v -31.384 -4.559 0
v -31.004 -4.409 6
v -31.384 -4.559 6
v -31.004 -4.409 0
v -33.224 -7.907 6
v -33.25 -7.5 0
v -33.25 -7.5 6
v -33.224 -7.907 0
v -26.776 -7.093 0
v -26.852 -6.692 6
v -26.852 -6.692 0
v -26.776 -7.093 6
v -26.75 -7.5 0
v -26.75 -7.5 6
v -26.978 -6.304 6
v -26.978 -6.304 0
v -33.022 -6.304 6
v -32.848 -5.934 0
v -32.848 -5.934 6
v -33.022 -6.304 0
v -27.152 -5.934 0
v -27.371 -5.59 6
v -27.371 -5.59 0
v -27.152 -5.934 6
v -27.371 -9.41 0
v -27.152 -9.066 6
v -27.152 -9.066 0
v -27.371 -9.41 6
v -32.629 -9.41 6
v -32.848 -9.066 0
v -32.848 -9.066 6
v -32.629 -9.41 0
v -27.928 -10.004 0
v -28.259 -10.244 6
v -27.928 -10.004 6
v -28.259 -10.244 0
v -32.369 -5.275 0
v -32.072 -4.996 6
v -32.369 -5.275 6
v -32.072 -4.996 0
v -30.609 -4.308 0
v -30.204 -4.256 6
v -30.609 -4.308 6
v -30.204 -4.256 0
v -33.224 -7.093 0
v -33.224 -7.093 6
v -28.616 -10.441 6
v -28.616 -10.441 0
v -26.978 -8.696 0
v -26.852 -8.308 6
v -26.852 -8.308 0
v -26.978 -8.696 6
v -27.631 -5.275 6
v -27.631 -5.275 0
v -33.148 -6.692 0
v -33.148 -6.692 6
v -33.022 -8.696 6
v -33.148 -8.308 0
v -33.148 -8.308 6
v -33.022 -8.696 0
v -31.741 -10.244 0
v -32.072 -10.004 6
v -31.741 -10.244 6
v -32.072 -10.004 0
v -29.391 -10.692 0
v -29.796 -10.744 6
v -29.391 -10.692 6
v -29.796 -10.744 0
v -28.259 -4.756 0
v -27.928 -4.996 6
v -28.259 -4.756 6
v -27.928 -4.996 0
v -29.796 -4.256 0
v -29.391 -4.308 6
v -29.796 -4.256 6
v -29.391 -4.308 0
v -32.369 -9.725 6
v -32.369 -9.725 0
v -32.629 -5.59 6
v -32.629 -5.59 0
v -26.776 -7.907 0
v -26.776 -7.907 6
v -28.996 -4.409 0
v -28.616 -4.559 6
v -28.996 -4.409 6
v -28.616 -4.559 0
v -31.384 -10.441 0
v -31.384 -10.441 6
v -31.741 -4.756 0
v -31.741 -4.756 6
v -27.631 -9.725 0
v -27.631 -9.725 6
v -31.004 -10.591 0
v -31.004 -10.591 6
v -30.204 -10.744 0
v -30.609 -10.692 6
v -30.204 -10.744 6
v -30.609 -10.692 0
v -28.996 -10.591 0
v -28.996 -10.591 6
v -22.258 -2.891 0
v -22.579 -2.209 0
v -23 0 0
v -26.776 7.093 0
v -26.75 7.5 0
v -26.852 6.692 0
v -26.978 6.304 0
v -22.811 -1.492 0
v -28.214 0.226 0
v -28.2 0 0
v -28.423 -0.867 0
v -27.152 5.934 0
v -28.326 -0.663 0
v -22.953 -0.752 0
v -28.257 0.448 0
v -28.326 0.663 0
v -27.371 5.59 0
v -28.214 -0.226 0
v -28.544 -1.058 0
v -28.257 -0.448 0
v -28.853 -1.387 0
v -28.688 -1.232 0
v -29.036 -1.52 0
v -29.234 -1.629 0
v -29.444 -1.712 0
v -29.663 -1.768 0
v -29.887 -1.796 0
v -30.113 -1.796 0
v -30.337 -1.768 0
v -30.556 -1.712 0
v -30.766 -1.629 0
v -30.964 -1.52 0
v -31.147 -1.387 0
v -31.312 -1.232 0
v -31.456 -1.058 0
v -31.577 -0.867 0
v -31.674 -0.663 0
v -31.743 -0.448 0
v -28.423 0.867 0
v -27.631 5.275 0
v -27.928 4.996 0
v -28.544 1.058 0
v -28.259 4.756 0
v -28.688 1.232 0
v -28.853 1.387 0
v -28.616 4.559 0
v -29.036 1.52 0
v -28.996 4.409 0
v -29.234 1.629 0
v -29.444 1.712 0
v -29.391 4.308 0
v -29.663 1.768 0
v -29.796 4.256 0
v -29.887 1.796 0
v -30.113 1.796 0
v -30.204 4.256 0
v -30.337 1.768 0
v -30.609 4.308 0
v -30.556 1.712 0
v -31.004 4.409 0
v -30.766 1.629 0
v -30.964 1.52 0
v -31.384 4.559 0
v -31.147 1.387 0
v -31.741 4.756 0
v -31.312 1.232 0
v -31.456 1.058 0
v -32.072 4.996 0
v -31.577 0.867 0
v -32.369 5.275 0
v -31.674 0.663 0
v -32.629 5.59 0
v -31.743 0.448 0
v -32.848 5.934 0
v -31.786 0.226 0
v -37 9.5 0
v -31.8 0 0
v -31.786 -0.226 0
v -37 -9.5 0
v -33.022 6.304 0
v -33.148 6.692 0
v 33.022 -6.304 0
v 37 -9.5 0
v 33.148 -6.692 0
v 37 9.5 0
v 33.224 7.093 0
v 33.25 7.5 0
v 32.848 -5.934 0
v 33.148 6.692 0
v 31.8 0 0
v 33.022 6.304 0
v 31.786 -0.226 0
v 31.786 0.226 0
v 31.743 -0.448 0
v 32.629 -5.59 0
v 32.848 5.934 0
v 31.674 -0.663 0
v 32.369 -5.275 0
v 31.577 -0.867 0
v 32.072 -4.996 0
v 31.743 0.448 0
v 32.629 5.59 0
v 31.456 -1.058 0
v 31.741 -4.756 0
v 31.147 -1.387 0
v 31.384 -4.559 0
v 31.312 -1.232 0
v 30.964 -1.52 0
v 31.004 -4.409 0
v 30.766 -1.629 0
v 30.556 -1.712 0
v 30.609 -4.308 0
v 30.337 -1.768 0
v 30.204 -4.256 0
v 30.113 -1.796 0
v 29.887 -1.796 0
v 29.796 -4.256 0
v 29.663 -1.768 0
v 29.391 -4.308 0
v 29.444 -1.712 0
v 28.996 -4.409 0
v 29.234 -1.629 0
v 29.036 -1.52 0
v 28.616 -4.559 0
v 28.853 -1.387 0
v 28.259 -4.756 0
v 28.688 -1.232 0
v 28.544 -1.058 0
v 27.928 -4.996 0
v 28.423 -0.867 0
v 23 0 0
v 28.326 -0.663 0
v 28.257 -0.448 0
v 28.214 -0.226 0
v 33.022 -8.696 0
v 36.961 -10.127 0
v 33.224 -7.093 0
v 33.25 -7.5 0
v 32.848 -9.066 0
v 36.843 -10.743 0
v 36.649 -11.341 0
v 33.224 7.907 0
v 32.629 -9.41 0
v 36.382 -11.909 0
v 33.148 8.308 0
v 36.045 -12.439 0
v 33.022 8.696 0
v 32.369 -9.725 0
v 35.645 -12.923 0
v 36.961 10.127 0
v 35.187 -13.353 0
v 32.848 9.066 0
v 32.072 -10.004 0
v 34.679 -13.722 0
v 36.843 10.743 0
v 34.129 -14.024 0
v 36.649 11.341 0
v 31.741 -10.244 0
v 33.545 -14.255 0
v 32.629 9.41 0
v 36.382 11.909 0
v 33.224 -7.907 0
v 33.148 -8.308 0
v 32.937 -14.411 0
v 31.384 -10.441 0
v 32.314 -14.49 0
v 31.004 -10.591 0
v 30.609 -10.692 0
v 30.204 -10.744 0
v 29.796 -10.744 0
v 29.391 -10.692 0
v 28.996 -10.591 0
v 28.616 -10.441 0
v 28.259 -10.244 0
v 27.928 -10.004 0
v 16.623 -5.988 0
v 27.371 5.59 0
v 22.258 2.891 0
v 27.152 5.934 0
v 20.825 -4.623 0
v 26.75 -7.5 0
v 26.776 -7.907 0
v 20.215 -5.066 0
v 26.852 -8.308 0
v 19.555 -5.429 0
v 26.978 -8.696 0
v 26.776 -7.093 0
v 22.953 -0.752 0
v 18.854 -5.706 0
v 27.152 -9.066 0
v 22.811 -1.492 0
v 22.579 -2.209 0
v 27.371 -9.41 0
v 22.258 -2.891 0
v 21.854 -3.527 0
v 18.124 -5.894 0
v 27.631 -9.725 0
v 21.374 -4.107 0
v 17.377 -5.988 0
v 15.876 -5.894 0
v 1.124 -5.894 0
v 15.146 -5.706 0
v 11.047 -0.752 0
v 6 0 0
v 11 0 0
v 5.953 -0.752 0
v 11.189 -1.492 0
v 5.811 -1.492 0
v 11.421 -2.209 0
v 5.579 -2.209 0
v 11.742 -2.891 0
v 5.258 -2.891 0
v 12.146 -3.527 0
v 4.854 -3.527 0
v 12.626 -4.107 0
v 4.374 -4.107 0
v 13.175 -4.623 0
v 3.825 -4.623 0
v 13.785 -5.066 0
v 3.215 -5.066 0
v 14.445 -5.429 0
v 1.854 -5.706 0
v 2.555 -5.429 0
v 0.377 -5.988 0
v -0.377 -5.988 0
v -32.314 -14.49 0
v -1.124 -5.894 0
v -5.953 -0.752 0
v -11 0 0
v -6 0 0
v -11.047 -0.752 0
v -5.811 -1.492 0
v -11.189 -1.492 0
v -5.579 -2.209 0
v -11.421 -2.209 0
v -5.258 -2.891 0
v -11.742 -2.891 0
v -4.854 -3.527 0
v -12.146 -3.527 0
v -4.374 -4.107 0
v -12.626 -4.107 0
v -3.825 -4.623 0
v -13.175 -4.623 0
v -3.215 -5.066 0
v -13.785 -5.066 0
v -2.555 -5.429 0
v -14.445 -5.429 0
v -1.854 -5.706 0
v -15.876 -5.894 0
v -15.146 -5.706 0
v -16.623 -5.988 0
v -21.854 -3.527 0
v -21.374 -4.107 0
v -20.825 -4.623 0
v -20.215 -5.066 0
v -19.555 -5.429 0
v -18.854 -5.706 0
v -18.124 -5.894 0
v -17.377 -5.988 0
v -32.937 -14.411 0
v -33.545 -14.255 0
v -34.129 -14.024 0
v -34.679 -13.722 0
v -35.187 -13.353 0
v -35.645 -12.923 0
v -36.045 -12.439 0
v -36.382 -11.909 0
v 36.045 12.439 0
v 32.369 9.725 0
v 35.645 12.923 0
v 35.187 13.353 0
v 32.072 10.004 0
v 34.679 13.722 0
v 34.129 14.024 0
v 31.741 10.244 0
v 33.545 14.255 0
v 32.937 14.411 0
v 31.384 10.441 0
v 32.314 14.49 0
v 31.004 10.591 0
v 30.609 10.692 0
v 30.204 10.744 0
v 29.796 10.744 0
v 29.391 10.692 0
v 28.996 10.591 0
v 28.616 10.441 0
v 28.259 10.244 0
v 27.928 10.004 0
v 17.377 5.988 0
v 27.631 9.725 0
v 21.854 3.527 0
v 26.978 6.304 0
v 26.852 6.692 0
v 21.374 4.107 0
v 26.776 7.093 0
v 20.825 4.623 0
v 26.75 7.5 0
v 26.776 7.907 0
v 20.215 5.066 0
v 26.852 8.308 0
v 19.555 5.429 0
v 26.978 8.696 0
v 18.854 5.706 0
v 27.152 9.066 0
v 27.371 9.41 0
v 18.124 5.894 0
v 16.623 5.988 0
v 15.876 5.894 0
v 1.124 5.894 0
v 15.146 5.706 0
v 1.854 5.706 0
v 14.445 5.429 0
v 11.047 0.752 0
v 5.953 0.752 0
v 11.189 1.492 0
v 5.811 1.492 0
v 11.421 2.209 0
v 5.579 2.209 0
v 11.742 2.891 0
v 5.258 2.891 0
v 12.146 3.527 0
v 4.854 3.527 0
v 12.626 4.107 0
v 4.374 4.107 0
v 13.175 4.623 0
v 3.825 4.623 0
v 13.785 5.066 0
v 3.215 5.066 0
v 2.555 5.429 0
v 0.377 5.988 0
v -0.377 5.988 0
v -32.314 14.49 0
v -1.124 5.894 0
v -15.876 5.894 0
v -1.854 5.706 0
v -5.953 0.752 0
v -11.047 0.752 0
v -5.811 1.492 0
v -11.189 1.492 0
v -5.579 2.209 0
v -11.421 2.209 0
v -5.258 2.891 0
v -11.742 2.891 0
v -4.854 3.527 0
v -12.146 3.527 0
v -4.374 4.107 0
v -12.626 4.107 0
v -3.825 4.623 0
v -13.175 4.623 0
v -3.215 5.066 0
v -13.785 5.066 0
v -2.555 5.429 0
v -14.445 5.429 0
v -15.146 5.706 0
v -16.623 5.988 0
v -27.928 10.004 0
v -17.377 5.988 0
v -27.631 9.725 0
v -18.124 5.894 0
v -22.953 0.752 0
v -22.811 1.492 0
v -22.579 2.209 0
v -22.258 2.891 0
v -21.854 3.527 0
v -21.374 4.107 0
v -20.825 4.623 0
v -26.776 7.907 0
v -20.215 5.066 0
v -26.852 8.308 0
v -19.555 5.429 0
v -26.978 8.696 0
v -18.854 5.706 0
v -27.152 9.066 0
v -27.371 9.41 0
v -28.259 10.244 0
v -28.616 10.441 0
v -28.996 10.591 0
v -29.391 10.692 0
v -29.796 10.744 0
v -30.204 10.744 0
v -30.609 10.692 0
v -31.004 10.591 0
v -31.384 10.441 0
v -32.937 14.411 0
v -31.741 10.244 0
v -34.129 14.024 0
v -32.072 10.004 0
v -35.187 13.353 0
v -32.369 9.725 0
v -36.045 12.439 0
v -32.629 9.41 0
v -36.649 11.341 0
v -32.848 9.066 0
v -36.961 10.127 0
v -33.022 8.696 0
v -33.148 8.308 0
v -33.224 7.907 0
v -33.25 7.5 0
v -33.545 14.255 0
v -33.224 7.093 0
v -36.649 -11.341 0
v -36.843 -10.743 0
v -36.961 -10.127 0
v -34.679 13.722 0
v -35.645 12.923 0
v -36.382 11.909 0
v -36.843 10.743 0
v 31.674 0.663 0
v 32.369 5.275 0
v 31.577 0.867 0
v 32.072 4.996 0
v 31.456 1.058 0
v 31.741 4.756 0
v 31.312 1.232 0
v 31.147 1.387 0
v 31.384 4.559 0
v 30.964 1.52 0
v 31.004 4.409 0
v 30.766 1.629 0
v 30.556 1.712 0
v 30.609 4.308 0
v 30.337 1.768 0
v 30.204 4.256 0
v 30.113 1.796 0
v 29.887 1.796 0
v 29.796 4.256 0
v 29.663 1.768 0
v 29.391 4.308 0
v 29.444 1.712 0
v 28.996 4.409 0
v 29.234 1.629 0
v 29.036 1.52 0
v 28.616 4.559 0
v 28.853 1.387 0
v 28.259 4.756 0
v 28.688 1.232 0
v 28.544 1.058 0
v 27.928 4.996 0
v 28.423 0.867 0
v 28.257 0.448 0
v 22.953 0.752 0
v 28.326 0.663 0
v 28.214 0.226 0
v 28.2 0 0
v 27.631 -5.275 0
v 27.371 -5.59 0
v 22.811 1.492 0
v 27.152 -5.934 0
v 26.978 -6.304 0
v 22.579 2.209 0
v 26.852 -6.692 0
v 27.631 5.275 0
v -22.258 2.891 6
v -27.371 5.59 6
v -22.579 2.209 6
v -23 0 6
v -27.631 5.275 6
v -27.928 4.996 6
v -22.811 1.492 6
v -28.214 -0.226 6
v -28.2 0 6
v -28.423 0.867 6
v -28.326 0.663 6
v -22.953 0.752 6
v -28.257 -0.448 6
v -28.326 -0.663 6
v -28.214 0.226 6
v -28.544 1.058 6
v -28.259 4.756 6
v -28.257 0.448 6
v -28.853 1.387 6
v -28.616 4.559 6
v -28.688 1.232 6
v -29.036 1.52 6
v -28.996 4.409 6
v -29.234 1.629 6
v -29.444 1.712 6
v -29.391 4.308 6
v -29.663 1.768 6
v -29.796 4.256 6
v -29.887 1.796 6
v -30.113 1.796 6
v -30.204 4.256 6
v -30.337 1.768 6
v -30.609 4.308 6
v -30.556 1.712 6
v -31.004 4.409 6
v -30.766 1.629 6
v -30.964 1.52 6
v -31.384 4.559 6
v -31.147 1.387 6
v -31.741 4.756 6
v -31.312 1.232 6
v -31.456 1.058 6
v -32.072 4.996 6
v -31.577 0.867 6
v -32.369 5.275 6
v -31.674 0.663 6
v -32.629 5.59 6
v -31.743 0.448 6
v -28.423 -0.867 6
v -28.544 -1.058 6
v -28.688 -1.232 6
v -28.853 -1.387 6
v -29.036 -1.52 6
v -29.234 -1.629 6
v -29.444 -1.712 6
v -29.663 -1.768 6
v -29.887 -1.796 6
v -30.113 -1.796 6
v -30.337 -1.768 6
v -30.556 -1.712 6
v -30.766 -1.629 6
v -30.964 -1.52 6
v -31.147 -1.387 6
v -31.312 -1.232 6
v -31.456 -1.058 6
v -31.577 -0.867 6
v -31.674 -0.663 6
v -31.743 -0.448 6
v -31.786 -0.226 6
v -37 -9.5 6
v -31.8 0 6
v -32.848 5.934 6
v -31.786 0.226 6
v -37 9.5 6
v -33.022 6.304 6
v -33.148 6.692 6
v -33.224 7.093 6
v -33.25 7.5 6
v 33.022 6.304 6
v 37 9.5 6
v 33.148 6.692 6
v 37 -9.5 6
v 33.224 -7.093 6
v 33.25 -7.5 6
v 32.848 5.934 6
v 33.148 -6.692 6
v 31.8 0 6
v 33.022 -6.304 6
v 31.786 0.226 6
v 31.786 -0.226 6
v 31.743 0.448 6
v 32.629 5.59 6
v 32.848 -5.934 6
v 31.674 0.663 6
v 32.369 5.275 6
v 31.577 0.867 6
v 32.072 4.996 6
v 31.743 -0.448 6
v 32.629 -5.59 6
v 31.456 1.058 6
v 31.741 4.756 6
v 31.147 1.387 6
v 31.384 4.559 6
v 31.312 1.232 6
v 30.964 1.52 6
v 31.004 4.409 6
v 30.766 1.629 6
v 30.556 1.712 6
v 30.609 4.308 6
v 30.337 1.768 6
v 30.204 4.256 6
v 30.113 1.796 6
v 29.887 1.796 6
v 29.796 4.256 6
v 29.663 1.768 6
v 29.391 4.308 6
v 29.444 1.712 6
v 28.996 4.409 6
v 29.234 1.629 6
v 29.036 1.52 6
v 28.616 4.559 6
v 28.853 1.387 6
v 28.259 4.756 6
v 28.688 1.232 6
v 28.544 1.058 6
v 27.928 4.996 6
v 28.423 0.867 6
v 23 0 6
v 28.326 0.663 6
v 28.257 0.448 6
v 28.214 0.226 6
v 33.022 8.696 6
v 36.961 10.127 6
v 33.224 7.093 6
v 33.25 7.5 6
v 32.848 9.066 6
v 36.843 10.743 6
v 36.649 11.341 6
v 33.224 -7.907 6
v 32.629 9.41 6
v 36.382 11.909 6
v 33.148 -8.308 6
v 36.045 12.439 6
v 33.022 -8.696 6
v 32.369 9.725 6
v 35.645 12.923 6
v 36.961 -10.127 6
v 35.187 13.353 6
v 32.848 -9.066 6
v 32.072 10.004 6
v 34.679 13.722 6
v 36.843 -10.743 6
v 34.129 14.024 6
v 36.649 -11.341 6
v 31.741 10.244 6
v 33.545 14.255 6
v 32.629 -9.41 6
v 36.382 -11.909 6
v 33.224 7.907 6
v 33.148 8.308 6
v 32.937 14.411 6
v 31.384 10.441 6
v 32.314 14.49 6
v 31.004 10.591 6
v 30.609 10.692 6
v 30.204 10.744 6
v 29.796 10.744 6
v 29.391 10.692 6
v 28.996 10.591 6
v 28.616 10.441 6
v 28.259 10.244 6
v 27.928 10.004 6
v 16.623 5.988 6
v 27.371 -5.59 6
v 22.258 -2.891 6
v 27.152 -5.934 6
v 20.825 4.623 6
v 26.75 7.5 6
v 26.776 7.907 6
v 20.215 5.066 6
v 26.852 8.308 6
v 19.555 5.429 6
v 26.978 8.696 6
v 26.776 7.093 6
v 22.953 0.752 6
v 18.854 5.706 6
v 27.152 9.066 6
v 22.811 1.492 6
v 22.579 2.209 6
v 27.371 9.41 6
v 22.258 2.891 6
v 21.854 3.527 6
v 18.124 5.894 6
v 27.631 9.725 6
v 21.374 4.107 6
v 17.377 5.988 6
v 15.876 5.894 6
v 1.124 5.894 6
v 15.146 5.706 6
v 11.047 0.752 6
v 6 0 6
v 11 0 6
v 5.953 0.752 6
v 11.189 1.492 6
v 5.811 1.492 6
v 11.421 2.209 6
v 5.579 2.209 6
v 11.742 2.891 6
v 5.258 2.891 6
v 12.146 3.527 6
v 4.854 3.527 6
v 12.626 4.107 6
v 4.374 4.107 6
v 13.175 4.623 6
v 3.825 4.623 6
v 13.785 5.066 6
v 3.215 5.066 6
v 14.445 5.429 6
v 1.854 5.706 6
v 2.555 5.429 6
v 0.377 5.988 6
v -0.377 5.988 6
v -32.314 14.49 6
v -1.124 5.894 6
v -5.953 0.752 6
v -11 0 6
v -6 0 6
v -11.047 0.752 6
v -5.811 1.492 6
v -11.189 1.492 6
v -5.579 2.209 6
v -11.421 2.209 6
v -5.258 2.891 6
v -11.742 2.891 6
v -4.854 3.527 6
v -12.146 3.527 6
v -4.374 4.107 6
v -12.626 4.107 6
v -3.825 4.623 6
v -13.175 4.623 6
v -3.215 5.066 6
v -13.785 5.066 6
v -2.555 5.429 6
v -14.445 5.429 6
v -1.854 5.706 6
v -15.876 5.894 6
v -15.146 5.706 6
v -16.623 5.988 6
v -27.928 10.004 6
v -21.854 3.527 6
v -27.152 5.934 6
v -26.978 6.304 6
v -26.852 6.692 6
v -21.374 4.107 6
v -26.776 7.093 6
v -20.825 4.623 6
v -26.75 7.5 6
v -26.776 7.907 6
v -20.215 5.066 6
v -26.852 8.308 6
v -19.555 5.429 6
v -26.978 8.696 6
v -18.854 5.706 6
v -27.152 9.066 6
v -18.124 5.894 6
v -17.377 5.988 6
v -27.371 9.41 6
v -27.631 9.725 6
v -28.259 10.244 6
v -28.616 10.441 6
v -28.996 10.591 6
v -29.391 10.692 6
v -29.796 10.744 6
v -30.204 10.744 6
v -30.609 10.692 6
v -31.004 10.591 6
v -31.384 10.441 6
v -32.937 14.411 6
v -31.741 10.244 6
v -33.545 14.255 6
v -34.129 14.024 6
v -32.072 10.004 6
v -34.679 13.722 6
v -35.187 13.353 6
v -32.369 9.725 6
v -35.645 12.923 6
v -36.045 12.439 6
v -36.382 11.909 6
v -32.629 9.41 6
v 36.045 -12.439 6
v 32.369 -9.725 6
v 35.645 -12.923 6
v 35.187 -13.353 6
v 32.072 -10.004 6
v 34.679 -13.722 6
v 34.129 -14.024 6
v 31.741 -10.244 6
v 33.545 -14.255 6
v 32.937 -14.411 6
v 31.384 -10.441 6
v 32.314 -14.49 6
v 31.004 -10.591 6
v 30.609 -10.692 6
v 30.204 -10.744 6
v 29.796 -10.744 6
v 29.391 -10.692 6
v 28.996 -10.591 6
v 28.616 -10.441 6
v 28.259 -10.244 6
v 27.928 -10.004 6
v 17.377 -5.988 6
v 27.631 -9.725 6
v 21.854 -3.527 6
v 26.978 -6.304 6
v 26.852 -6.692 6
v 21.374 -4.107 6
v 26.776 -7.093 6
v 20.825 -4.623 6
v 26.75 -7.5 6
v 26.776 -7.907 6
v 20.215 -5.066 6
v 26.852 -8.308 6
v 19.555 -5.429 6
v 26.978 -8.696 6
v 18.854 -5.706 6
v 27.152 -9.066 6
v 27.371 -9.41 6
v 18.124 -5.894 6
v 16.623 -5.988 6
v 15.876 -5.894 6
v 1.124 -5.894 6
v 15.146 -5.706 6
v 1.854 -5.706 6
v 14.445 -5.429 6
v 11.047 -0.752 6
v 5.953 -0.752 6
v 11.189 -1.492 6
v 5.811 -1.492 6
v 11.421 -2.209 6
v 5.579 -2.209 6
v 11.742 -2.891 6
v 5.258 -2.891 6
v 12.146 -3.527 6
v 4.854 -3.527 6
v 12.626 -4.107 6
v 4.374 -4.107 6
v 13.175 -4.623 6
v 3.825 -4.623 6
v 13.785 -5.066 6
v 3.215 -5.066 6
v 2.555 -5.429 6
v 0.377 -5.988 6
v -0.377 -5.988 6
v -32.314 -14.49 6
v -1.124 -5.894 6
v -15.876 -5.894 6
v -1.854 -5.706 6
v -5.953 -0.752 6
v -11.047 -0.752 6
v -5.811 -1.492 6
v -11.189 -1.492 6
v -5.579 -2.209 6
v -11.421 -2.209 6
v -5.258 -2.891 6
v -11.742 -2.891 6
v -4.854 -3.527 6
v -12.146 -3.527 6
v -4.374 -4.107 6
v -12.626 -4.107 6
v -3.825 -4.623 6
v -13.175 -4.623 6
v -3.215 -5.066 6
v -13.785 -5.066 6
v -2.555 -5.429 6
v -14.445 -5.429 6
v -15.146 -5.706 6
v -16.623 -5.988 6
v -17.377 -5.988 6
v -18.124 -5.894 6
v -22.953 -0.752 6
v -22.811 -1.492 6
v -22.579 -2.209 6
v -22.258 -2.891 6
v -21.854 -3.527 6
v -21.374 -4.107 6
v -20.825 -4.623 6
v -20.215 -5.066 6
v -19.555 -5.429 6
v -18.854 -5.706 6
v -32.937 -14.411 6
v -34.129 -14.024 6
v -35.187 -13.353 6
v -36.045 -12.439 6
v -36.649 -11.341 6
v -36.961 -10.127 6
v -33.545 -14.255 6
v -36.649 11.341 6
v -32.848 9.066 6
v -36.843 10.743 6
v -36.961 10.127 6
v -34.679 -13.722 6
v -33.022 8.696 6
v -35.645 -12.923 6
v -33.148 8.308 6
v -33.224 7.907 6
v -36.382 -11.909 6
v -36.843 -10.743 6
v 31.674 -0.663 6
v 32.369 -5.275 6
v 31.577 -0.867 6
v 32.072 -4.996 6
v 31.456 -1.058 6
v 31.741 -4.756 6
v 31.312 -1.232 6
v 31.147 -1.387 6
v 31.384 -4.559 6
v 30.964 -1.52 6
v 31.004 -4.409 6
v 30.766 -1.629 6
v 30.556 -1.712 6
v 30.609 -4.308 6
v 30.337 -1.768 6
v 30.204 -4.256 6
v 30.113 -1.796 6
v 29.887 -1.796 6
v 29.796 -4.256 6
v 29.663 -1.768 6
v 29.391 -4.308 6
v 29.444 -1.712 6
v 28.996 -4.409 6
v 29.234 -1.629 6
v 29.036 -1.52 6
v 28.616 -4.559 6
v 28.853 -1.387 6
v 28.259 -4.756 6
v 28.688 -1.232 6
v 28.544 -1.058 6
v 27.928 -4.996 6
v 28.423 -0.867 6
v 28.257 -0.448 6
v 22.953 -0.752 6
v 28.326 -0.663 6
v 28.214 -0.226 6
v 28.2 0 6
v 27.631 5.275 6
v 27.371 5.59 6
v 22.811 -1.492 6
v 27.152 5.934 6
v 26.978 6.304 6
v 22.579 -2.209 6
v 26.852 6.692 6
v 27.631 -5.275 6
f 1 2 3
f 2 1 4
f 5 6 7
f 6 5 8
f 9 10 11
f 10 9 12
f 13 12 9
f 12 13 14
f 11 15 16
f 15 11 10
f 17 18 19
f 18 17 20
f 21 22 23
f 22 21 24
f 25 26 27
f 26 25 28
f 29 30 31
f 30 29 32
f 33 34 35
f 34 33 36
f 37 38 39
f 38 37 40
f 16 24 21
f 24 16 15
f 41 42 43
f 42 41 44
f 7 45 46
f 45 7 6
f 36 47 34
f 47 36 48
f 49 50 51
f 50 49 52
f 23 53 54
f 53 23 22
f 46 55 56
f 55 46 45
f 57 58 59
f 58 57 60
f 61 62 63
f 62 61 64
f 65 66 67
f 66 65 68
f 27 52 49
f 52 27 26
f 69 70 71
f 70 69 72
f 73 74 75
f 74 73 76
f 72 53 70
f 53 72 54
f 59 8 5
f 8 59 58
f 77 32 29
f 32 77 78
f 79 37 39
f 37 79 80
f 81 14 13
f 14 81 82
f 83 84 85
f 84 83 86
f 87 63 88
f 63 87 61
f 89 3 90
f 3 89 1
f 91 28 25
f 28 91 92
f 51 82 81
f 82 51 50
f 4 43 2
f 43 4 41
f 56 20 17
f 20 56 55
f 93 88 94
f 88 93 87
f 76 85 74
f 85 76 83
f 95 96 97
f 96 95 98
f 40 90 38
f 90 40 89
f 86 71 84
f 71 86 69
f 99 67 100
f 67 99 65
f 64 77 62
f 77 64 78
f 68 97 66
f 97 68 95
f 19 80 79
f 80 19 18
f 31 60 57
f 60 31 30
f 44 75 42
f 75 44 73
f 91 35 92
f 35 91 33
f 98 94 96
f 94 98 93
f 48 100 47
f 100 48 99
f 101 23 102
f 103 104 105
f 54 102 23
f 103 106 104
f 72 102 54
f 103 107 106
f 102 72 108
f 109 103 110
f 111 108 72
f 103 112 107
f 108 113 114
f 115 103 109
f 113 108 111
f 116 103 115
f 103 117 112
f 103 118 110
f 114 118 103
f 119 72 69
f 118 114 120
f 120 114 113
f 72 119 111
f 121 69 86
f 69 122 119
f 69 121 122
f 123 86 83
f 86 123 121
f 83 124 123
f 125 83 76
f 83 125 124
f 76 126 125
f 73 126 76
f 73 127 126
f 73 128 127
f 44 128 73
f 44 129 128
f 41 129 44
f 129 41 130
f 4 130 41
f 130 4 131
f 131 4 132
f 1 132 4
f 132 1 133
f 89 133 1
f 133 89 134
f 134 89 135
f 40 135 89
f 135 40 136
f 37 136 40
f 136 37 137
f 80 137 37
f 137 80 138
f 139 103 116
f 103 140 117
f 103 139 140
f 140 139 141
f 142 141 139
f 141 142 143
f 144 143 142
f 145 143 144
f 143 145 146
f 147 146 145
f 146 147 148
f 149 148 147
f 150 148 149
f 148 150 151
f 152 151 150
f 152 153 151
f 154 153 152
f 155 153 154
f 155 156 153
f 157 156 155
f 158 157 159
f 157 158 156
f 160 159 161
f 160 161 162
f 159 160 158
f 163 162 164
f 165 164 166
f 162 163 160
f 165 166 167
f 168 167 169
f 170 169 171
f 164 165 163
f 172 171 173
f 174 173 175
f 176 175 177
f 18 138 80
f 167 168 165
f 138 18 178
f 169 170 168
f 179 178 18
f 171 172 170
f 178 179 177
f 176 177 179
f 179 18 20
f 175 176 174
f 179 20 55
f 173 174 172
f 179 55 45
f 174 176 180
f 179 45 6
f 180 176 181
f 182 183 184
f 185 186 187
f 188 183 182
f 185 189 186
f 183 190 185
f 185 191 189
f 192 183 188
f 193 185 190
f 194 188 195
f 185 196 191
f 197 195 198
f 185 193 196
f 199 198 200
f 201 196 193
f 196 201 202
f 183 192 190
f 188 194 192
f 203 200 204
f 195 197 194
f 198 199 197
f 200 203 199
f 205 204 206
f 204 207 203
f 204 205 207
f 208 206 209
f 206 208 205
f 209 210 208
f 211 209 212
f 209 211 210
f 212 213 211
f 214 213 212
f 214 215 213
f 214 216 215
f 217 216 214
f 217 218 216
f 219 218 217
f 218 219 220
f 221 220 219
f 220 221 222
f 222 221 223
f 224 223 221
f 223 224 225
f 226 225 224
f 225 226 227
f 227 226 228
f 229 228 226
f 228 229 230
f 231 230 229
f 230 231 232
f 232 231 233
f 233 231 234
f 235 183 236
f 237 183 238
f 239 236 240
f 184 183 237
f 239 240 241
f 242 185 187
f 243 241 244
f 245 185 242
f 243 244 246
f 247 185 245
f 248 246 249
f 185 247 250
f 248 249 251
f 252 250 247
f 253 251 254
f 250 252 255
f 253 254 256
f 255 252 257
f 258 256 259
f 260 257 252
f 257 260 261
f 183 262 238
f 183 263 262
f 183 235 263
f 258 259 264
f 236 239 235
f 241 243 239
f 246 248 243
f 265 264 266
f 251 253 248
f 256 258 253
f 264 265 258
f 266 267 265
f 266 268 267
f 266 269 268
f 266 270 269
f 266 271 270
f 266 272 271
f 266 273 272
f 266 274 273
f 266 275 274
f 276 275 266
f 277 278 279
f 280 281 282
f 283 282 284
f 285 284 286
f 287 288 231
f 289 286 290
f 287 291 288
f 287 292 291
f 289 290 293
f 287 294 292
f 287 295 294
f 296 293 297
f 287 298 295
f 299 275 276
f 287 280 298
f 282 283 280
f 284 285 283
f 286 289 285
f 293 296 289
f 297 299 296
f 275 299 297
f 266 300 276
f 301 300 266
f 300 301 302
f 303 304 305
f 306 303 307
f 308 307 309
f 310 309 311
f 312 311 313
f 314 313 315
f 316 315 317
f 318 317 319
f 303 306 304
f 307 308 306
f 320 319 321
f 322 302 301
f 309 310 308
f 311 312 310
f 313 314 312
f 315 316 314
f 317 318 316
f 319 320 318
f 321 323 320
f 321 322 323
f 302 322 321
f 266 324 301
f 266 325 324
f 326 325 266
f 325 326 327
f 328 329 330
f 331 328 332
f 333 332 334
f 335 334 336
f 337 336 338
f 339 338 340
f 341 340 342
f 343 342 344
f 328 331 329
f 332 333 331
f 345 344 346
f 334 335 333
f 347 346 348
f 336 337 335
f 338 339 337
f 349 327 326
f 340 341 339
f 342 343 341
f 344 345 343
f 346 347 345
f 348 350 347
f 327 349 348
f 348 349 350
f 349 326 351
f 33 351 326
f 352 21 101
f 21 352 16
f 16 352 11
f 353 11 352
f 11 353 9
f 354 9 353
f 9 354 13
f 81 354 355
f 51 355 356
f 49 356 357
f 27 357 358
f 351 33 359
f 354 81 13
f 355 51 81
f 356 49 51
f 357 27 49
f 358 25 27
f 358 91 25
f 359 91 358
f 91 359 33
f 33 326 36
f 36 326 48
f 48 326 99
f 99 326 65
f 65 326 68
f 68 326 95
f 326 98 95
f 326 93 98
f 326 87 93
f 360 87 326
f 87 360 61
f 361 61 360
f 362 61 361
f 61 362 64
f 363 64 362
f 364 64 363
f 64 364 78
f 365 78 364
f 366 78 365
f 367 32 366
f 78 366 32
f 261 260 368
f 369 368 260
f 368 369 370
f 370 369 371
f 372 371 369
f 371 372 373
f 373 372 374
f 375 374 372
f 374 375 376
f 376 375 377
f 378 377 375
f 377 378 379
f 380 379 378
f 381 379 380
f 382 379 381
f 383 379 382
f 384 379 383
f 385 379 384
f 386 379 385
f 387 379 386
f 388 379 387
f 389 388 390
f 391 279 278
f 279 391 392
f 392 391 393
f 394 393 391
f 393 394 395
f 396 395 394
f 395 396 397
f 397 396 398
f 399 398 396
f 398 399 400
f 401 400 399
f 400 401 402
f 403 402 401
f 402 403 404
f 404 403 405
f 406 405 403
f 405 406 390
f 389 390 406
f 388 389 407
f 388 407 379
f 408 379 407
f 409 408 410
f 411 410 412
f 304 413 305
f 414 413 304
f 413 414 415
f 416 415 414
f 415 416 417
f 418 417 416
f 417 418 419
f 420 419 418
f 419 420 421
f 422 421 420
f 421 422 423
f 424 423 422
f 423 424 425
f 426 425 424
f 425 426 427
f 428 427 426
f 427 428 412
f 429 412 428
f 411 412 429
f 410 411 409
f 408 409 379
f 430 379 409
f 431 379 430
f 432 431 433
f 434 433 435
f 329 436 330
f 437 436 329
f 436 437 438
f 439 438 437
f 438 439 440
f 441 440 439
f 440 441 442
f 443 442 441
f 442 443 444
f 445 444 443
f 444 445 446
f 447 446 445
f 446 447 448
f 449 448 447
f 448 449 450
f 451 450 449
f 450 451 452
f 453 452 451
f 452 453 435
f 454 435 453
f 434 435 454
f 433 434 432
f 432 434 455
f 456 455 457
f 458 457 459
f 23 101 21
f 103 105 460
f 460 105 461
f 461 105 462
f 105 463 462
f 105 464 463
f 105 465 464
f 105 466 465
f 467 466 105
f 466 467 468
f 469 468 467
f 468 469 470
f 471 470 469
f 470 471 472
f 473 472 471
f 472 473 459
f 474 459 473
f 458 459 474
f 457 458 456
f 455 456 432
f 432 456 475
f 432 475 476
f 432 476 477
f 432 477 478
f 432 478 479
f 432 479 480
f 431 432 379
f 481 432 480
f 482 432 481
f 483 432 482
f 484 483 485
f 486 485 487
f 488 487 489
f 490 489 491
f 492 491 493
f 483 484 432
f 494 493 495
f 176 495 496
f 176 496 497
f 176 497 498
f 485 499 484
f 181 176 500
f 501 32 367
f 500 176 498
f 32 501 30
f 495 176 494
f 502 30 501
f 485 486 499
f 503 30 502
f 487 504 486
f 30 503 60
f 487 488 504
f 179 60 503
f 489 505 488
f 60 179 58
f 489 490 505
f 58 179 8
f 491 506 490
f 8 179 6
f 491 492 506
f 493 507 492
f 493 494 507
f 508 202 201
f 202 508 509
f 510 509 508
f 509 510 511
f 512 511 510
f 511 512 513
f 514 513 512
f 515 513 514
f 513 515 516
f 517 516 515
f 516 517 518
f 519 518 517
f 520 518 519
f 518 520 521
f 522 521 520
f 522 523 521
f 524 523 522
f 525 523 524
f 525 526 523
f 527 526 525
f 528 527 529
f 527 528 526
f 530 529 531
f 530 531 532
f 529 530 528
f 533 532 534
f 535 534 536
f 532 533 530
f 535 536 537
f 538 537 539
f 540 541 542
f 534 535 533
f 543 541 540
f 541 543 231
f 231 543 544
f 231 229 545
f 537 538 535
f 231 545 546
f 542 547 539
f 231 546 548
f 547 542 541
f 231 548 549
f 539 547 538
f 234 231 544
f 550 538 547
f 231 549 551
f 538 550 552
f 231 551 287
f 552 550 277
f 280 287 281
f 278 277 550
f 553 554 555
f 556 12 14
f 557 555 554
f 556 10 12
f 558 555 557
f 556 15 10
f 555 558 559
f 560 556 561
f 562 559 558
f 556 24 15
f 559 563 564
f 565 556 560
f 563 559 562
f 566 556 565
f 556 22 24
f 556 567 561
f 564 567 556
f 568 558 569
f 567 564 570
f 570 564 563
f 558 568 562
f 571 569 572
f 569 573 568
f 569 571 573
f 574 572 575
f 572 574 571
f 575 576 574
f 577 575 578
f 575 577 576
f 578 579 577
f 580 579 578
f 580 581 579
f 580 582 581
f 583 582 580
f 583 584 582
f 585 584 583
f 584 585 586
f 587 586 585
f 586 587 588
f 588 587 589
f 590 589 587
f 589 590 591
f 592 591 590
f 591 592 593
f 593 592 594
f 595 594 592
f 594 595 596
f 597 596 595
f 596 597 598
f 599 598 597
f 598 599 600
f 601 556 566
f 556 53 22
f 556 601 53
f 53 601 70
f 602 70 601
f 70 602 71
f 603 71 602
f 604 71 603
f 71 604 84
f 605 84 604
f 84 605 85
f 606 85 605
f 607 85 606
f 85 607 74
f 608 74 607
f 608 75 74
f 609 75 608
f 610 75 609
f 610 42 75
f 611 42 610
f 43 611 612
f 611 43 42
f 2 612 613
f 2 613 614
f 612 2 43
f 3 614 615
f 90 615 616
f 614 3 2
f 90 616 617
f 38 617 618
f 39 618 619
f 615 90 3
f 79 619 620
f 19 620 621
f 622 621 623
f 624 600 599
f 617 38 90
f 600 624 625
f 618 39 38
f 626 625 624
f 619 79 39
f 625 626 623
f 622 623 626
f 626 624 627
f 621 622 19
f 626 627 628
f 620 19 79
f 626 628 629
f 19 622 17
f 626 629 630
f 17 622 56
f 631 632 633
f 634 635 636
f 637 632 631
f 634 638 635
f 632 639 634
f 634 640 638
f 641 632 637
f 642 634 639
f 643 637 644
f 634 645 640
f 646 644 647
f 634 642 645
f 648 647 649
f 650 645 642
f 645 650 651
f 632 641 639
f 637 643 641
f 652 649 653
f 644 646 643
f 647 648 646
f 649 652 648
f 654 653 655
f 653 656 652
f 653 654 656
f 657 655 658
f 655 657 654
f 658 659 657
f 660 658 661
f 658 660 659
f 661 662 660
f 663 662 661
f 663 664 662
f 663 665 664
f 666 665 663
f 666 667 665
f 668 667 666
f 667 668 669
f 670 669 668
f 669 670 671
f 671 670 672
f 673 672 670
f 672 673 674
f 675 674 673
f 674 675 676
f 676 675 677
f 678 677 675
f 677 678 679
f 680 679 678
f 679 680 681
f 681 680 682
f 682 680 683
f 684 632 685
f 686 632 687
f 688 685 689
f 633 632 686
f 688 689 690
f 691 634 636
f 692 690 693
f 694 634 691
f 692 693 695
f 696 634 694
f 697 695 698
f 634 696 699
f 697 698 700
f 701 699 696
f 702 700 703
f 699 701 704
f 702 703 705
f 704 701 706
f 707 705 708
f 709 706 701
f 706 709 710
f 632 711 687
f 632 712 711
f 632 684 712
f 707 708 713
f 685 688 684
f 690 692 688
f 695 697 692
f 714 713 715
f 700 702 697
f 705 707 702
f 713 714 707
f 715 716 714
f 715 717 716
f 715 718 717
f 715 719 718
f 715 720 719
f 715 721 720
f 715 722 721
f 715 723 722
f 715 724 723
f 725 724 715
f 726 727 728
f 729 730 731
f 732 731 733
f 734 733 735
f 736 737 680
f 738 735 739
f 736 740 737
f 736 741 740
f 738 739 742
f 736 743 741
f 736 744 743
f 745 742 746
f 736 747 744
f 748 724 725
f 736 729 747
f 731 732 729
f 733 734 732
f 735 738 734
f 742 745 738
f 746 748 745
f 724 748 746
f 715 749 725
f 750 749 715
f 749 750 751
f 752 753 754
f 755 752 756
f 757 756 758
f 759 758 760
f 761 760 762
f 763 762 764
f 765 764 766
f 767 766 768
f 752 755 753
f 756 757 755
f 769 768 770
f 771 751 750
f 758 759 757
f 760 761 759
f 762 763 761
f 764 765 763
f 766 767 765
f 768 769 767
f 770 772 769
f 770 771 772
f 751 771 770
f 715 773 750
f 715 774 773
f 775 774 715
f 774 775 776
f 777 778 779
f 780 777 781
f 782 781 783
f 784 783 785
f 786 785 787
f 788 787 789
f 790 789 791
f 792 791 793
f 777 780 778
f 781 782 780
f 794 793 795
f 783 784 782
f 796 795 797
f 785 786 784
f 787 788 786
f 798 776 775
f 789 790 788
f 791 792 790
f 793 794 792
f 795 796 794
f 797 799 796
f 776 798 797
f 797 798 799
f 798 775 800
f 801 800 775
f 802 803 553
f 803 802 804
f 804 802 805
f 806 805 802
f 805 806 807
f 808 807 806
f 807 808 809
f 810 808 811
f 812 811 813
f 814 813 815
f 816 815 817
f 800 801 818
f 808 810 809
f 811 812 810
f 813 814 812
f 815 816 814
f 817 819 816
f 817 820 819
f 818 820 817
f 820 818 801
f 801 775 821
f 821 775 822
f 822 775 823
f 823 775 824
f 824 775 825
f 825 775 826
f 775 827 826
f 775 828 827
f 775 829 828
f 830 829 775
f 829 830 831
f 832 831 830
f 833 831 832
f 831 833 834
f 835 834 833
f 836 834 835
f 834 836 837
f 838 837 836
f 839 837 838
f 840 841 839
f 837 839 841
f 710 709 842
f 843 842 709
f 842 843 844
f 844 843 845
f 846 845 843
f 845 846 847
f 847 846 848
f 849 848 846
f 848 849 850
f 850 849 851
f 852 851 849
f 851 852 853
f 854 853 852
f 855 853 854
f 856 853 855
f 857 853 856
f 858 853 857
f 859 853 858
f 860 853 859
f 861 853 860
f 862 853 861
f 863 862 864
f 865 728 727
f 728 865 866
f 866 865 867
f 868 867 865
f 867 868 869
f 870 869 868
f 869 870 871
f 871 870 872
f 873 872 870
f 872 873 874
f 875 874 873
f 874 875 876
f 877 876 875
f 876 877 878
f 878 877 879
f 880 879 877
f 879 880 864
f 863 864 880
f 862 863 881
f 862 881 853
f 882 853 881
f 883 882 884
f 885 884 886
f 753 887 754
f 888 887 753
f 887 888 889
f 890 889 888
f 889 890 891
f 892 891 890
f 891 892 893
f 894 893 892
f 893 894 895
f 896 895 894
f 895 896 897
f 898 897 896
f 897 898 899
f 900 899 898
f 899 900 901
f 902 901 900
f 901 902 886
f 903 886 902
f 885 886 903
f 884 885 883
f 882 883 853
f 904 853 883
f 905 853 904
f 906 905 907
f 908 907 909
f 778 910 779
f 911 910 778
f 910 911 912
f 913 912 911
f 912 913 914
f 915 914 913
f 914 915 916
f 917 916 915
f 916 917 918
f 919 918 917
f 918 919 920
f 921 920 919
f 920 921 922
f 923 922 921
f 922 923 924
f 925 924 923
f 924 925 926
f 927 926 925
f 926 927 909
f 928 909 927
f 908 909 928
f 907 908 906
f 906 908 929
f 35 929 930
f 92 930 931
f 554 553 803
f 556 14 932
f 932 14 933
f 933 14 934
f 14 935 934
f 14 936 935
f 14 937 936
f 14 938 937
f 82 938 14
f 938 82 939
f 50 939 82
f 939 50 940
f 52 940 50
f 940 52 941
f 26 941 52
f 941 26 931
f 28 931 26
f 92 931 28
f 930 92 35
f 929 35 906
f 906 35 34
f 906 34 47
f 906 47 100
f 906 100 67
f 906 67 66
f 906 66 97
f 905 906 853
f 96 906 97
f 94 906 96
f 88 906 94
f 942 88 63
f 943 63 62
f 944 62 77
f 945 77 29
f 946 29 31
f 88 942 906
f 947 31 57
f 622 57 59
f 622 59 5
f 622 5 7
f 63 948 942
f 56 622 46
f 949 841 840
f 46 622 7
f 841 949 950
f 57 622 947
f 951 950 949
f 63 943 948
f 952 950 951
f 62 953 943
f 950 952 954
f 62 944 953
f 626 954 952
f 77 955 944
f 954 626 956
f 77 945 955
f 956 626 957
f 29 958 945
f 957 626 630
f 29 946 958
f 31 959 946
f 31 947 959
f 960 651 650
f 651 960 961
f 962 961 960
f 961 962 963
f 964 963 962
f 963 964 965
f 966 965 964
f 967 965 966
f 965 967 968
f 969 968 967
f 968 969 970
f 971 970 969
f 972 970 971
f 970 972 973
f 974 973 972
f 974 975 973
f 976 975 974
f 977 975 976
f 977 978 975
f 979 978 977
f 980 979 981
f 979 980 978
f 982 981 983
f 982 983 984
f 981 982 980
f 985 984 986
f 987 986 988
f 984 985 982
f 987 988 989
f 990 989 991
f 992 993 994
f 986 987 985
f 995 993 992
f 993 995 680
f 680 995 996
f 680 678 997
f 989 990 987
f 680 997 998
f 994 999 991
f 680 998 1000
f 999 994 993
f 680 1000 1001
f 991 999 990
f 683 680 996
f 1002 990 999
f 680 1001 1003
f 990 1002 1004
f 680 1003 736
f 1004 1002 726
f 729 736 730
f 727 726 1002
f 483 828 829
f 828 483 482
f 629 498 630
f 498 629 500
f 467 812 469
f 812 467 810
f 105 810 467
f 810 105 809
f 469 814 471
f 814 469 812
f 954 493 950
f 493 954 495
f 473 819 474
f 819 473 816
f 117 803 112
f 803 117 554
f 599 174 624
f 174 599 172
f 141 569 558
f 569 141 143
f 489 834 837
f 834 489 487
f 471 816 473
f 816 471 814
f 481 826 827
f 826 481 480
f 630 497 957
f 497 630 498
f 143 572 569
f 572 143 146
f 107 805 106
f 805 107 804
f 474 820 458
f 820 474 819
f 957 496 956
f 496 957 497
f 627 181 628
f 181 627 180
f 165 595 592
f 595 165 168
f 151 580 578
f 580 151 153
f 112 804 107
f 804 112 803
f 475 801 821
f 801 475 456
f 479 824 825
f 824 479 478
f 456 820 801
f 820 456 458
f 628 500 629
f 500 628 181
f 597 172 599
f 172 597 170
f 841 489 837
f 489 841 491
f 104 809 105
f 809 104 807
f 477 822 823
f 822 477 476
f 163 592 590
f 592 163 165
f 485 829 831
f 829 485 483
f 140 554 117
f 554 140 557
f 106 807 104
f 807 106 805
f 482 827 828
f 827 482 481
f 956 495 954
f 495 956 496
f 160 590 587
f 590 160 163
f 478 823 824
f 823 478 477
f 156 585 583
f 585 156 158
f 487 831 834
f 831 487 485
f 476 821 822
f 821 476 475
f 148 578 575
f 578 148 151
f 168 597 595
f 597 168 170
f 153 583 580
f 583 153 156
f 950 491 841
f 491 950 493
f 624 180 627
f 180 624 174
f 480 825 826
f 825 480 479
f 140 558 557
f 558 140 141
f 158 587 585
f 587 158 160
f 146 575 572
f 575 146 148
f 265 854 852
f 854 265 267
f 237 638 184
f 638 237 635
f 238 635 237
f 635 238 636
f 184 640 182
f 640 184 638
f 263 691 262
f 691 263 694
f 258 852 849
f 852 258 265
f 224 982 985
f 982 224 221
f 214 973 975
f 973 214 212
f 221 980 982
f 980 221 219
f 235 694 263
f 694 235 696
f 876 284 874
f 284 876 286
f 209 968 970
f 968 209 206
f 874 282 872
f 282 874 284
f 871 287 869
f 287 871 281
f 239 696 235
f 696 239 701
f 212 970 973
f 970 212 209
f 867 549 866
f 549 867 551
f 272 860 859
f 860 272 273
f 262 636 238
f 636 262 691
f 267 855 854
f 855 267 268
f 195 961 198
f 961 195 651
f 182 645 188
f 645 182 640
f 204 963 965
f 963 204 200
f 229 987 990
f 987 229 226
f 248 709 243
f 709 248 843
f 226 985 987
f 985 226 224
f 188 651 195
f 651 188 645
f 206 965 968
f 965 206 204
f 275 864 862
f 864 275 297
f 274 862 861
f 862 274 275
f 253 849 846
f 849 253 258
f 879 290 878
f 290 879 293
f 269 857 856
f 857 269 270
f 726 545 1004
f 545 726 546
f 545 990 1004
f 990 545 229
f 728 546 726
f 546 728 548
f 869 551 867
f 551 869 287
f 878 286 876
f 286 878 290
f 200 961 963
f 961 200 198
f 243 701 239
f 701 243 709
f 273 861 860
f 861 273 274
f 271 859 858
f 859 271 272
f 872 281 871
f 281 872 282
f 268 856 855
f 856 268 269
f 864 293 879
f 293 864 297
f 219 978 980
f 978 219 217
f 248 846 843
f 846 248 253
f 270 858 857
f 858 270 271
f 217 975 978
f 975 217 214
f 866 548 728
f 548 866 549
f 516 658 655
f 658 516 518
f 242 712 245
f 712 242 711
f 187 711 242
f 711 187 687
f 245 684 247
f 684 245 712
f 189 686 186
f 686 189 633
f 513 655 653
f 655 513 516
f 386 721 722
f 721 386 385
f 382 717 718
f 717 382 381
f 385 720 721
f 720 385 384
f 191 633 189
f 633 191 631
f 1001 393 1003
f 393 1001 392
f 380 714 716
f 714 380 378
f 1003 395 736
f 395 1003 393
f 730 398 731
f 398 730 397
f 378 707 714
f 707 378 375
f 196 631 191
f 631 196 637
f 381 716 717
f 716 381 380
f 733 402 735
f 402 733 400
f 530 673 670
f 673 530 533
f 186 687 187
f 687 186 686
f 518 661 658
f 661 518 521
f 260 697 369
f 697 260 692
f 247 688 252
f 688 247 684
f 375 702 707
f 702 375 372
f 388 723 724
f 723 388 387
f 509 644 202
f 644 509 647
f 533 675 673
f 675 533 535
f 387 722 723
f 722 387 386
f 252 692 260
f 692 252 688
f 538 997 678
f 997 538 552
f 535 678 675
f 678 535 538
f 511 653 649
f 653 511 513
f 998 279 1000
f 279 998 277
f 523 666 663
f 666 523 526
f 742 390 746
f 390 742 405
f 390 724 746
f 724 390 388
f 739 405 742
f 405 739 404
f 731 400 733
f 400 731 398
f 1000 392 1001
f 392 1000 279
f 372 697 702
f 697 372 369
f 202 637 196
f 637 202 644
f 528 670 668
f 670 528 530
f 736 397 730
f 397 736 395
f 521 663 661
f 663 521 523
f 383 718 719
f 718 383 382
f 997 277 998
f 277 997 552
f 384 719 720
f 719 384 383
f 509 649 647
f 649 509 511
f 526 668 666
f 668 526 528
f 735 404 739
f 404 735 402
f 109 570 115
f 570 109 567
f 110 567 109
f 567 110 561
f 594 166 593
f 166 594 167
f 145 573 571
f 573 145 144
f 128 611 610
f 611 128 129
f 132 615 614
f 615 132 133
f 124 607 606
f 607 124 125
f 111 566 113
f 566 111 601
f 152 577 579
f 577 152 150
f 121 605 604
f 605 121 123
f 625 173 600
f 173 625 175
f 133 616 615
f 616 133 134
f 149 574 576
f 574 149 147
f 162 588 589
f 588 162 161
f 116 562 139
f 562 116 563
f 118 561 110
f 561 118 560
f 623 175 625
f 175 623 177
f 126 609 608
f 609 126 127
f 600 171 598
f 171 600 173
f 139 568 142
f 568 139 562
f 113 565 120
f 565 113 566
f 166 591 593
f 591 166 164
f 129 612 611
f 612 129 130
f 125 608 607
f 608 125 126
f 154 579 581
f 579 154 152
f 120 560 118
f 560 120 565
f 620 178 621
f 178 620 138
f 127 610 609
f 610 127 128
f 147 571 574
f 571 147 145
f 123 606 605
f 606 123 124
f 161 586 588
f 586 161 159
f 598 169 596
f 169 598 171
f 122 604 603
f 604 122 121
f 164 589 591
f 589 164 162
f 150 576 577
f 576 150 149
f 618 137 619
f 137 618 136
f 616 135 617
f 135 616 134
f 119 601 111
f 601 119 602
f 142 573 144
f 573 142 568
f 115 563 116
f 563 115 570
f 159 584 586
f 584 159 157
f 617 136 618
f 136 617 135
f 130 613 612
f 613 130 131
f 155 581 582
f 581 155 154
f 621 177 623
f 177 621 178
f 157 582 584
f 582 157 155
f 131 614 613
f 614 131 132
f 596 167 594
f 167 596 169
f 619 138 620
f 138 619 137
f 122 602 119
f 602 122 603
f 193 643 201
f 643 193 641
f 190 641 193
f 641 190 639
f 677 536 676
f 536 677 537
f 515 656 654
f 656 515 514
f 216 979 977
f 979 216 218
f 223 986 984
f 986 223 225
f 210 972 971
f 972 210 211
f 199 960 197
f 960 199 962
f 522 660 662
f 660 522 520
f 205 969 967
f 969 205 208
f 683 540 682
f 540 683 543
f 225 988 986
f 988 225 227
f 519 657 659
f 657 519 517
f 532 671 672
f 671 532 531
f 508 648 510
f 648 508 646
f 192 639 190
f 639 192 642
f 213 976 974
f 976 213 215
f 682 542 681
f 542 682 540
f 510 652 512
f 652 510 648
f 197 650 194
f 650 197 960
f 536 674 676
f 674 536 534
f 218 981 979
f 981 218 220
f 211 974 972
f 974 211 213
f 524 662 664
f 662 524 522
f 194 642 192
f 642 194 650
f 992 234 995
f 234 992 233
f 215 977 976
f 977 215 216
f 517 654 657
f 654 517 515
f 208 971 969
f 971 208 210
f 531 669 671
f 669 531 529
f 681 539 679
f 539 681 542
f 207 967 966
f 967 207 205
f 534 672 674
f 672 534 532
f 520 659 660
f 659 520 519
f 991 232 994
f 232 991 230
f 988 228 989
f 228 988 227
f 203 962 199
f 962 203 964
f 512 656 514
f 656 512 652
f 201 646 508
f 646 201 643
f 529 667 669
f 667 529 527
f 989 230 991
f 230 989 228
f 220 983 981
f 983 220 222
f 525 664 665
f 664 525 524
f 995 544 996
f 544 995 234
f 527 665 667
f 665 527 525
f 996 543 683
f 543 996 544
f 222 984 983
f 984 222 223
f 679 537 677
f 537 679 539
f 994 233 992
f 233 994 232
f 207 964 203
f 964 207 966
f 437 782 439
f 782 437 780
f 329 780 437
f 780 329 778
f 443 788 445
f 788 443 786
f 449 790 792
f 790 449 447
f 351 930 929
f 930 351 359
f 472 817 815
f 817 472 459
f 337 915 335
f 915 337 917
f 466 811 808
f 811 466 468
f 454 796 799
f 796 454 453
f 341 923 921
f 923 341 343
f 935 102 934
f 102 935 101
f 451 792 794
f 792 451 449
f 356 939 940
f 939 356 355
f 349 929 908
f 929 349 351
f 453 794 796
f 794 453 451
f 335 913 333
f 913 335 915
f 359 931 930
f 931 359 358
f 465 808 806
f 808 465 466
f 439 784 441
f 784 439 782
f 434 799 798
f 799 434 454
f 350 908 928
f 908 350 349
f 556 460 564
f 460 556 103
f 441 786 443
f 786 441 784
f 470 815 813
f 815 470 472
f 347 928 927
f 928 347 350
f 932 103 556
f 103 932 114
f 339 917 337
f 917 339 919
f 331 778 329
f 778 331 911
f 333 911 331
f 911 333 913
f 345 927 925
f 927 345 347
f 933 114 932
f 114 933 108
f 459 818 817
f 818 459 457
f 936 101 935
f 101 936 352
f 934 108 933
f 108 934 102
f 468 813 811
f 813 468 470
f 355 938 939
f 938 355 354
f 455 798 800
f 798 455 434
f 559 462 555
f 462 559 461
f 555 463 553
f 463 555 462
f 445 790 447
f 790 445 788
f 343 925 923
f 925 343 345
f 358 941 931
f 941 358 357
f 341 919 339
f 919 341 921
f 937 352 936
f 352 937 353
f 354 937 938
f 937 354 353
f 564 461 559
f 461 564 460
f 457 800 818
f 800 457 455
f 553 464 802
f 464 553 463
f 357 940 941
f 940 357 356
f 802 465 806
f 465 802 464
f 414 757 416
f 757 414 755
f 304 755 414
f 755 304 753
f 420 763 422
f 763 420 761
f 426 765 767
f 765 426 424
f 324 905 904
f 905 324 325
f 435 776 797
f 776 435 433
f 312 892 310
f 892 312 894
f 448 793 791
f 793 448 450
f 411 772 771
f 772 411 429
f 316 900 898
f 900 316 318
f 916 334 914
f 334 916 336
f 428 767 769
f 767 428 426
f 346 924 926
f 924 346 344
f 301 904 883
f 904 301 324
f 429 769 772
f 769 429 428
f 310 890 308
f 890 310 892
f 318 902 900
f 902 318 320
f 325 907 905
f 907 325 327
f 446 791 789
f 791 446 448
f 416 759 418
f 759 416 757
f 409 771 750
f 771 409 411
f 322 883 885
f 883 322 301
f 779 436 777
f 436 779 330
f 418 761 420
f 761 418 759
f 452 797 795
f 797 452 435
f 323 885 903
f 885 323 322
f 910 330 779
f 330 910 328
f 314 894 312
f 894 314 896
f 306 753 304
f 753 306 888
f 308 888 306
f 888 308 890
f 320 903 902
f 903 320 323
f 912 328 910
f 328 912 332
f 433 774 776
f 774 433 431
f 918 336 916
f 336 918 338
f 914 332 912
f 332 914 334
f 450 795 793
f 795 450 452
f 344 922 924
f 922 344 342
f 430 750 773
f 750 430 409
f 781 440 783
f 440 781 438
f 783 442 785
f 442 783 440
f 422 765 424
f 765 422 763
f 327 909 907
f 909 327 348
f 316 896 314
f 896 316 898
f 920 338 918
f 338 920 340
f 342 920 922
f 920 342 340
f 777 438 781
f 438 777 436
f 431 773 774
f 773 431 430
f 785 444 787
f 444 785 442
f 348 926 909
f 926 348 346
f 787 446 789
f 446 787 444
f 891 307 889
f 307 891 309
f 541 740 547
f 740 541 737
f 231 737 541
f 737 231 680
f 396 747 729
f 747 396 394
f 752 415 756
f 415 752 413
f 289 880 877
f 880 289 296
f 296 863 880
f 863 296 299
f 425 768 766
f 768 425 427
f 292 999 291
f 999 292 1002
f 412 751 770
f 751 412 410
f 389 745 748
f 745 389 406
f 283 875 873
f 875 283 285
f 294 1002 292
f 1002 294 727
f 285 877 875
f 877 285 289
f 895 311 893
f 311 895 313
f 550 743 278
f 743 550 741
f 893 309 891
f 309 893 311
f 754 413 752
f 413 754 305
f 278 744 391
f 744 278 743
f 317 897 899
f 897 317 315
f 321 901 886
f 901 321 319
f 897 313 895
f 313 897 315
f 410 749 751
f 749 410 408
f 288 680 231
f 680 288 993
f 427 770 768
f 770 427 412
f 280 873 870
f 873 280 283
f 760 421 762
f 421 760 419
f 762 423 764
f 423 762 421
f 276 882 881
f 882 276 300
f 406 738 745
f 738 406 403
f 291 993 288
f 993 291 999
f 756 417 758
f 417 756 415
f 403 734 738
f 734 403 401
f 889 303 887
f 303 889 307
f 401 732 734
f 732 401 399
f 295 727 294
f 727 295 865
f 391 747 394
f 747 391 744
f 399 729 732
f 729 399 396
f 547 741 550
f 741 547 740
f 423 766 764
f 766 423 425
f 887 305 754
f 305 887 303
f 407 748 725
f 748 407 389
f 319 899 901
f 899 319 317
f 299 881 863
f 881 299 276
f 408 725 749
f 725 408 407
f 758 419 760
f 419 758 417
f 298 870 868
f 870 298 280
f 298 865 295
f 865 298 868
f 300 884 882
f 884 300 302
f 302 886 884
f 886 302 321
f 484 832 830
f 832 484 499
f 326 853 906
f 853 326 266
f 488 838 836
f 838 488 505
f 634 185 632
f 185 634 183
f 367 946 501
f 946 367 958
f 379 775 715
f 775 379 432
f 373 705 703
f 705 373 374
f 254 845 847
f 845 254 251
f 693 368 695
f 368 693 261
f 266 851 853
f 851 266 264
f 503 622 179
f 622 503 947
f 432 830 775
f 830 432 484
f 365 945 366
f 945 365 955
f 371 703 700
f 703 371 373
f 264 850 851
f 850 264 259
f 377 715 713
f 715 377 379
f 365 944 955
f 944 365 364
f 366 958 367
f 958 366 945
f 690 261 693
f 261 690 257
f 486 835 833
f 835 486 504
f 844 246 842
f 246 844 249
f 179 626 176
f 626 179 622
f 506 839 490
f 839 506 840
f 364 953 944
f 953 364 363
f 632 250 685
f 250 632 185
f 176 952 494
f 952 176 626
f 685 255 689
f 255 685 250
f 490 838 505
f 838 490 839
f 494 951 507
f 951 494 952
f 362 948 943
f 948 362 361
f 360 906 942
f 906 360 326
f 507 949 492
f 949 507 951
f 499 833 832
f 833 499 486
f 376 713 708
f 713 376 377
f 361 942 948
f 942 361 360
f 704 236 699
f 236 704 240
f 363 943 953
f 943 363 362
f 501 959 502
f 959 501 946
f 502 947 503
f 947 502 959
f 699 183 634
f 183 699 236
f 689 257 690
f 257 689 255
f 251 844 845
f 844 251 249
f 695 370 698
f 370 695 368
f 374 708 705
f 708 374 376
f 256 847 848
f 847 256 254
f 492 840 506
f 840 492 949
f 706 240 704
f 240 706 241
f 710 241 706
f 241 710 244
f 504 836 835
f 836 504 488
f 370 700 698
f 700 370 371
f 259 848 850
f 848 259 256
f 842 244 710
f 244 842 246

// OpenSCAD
$fn = 50;

difference() {
	union() {
		hull() {
			translate(v = [-32.0, 9.5, 0]) {
				cylinder(h = 6, r = 5);
			}
			translate(v = [32.0, 9.5, 0]) {
				cylinder(h = 6, r = 5);
			}
			translate(v = [-32.0, -9.5, 0]) {
				cylinder(h = 6, r = 5);
			}
			translate(v = [32.0, -9.5, 0]) {
				cylinder(h = 6, r = 5);
			}
		}
	}
	union() {
		translate(v = [-30.0, -7.5, 0]) {
			cylinder(h = 6, r = 3.25);
		}
		translate(v = [-30.0, 7.5, 0]) {
			cylinder(h = 6, r = 3.25);
		}
		translate(v = [30.0, -7.5, 0]) {
			cylinder(h = 6, r = 3.25);
		}
		translate(v = [30.0, 7.5, 0]) {
			cylinder(h = 6, r = 3.25);
		}
		translate(v = [-30.0, 0.0, 0]) {
			cylinder(h = 6, r = 1.8);
		}
		translate(v = [30.0, 0.0, 0]) {
			cylinder(h = 6, r = 1.8);
		}
		translate(v = [-17.0, 0, 0.0]) {
			cylinder(h = 6, r = 6.0);
		}
		cylinder(h = 6, r = 6.0);
		translate(v = [17.0, 0, 0.0]) {
			cylinder(h = 6, r = 6.0);
		}
	}
}
